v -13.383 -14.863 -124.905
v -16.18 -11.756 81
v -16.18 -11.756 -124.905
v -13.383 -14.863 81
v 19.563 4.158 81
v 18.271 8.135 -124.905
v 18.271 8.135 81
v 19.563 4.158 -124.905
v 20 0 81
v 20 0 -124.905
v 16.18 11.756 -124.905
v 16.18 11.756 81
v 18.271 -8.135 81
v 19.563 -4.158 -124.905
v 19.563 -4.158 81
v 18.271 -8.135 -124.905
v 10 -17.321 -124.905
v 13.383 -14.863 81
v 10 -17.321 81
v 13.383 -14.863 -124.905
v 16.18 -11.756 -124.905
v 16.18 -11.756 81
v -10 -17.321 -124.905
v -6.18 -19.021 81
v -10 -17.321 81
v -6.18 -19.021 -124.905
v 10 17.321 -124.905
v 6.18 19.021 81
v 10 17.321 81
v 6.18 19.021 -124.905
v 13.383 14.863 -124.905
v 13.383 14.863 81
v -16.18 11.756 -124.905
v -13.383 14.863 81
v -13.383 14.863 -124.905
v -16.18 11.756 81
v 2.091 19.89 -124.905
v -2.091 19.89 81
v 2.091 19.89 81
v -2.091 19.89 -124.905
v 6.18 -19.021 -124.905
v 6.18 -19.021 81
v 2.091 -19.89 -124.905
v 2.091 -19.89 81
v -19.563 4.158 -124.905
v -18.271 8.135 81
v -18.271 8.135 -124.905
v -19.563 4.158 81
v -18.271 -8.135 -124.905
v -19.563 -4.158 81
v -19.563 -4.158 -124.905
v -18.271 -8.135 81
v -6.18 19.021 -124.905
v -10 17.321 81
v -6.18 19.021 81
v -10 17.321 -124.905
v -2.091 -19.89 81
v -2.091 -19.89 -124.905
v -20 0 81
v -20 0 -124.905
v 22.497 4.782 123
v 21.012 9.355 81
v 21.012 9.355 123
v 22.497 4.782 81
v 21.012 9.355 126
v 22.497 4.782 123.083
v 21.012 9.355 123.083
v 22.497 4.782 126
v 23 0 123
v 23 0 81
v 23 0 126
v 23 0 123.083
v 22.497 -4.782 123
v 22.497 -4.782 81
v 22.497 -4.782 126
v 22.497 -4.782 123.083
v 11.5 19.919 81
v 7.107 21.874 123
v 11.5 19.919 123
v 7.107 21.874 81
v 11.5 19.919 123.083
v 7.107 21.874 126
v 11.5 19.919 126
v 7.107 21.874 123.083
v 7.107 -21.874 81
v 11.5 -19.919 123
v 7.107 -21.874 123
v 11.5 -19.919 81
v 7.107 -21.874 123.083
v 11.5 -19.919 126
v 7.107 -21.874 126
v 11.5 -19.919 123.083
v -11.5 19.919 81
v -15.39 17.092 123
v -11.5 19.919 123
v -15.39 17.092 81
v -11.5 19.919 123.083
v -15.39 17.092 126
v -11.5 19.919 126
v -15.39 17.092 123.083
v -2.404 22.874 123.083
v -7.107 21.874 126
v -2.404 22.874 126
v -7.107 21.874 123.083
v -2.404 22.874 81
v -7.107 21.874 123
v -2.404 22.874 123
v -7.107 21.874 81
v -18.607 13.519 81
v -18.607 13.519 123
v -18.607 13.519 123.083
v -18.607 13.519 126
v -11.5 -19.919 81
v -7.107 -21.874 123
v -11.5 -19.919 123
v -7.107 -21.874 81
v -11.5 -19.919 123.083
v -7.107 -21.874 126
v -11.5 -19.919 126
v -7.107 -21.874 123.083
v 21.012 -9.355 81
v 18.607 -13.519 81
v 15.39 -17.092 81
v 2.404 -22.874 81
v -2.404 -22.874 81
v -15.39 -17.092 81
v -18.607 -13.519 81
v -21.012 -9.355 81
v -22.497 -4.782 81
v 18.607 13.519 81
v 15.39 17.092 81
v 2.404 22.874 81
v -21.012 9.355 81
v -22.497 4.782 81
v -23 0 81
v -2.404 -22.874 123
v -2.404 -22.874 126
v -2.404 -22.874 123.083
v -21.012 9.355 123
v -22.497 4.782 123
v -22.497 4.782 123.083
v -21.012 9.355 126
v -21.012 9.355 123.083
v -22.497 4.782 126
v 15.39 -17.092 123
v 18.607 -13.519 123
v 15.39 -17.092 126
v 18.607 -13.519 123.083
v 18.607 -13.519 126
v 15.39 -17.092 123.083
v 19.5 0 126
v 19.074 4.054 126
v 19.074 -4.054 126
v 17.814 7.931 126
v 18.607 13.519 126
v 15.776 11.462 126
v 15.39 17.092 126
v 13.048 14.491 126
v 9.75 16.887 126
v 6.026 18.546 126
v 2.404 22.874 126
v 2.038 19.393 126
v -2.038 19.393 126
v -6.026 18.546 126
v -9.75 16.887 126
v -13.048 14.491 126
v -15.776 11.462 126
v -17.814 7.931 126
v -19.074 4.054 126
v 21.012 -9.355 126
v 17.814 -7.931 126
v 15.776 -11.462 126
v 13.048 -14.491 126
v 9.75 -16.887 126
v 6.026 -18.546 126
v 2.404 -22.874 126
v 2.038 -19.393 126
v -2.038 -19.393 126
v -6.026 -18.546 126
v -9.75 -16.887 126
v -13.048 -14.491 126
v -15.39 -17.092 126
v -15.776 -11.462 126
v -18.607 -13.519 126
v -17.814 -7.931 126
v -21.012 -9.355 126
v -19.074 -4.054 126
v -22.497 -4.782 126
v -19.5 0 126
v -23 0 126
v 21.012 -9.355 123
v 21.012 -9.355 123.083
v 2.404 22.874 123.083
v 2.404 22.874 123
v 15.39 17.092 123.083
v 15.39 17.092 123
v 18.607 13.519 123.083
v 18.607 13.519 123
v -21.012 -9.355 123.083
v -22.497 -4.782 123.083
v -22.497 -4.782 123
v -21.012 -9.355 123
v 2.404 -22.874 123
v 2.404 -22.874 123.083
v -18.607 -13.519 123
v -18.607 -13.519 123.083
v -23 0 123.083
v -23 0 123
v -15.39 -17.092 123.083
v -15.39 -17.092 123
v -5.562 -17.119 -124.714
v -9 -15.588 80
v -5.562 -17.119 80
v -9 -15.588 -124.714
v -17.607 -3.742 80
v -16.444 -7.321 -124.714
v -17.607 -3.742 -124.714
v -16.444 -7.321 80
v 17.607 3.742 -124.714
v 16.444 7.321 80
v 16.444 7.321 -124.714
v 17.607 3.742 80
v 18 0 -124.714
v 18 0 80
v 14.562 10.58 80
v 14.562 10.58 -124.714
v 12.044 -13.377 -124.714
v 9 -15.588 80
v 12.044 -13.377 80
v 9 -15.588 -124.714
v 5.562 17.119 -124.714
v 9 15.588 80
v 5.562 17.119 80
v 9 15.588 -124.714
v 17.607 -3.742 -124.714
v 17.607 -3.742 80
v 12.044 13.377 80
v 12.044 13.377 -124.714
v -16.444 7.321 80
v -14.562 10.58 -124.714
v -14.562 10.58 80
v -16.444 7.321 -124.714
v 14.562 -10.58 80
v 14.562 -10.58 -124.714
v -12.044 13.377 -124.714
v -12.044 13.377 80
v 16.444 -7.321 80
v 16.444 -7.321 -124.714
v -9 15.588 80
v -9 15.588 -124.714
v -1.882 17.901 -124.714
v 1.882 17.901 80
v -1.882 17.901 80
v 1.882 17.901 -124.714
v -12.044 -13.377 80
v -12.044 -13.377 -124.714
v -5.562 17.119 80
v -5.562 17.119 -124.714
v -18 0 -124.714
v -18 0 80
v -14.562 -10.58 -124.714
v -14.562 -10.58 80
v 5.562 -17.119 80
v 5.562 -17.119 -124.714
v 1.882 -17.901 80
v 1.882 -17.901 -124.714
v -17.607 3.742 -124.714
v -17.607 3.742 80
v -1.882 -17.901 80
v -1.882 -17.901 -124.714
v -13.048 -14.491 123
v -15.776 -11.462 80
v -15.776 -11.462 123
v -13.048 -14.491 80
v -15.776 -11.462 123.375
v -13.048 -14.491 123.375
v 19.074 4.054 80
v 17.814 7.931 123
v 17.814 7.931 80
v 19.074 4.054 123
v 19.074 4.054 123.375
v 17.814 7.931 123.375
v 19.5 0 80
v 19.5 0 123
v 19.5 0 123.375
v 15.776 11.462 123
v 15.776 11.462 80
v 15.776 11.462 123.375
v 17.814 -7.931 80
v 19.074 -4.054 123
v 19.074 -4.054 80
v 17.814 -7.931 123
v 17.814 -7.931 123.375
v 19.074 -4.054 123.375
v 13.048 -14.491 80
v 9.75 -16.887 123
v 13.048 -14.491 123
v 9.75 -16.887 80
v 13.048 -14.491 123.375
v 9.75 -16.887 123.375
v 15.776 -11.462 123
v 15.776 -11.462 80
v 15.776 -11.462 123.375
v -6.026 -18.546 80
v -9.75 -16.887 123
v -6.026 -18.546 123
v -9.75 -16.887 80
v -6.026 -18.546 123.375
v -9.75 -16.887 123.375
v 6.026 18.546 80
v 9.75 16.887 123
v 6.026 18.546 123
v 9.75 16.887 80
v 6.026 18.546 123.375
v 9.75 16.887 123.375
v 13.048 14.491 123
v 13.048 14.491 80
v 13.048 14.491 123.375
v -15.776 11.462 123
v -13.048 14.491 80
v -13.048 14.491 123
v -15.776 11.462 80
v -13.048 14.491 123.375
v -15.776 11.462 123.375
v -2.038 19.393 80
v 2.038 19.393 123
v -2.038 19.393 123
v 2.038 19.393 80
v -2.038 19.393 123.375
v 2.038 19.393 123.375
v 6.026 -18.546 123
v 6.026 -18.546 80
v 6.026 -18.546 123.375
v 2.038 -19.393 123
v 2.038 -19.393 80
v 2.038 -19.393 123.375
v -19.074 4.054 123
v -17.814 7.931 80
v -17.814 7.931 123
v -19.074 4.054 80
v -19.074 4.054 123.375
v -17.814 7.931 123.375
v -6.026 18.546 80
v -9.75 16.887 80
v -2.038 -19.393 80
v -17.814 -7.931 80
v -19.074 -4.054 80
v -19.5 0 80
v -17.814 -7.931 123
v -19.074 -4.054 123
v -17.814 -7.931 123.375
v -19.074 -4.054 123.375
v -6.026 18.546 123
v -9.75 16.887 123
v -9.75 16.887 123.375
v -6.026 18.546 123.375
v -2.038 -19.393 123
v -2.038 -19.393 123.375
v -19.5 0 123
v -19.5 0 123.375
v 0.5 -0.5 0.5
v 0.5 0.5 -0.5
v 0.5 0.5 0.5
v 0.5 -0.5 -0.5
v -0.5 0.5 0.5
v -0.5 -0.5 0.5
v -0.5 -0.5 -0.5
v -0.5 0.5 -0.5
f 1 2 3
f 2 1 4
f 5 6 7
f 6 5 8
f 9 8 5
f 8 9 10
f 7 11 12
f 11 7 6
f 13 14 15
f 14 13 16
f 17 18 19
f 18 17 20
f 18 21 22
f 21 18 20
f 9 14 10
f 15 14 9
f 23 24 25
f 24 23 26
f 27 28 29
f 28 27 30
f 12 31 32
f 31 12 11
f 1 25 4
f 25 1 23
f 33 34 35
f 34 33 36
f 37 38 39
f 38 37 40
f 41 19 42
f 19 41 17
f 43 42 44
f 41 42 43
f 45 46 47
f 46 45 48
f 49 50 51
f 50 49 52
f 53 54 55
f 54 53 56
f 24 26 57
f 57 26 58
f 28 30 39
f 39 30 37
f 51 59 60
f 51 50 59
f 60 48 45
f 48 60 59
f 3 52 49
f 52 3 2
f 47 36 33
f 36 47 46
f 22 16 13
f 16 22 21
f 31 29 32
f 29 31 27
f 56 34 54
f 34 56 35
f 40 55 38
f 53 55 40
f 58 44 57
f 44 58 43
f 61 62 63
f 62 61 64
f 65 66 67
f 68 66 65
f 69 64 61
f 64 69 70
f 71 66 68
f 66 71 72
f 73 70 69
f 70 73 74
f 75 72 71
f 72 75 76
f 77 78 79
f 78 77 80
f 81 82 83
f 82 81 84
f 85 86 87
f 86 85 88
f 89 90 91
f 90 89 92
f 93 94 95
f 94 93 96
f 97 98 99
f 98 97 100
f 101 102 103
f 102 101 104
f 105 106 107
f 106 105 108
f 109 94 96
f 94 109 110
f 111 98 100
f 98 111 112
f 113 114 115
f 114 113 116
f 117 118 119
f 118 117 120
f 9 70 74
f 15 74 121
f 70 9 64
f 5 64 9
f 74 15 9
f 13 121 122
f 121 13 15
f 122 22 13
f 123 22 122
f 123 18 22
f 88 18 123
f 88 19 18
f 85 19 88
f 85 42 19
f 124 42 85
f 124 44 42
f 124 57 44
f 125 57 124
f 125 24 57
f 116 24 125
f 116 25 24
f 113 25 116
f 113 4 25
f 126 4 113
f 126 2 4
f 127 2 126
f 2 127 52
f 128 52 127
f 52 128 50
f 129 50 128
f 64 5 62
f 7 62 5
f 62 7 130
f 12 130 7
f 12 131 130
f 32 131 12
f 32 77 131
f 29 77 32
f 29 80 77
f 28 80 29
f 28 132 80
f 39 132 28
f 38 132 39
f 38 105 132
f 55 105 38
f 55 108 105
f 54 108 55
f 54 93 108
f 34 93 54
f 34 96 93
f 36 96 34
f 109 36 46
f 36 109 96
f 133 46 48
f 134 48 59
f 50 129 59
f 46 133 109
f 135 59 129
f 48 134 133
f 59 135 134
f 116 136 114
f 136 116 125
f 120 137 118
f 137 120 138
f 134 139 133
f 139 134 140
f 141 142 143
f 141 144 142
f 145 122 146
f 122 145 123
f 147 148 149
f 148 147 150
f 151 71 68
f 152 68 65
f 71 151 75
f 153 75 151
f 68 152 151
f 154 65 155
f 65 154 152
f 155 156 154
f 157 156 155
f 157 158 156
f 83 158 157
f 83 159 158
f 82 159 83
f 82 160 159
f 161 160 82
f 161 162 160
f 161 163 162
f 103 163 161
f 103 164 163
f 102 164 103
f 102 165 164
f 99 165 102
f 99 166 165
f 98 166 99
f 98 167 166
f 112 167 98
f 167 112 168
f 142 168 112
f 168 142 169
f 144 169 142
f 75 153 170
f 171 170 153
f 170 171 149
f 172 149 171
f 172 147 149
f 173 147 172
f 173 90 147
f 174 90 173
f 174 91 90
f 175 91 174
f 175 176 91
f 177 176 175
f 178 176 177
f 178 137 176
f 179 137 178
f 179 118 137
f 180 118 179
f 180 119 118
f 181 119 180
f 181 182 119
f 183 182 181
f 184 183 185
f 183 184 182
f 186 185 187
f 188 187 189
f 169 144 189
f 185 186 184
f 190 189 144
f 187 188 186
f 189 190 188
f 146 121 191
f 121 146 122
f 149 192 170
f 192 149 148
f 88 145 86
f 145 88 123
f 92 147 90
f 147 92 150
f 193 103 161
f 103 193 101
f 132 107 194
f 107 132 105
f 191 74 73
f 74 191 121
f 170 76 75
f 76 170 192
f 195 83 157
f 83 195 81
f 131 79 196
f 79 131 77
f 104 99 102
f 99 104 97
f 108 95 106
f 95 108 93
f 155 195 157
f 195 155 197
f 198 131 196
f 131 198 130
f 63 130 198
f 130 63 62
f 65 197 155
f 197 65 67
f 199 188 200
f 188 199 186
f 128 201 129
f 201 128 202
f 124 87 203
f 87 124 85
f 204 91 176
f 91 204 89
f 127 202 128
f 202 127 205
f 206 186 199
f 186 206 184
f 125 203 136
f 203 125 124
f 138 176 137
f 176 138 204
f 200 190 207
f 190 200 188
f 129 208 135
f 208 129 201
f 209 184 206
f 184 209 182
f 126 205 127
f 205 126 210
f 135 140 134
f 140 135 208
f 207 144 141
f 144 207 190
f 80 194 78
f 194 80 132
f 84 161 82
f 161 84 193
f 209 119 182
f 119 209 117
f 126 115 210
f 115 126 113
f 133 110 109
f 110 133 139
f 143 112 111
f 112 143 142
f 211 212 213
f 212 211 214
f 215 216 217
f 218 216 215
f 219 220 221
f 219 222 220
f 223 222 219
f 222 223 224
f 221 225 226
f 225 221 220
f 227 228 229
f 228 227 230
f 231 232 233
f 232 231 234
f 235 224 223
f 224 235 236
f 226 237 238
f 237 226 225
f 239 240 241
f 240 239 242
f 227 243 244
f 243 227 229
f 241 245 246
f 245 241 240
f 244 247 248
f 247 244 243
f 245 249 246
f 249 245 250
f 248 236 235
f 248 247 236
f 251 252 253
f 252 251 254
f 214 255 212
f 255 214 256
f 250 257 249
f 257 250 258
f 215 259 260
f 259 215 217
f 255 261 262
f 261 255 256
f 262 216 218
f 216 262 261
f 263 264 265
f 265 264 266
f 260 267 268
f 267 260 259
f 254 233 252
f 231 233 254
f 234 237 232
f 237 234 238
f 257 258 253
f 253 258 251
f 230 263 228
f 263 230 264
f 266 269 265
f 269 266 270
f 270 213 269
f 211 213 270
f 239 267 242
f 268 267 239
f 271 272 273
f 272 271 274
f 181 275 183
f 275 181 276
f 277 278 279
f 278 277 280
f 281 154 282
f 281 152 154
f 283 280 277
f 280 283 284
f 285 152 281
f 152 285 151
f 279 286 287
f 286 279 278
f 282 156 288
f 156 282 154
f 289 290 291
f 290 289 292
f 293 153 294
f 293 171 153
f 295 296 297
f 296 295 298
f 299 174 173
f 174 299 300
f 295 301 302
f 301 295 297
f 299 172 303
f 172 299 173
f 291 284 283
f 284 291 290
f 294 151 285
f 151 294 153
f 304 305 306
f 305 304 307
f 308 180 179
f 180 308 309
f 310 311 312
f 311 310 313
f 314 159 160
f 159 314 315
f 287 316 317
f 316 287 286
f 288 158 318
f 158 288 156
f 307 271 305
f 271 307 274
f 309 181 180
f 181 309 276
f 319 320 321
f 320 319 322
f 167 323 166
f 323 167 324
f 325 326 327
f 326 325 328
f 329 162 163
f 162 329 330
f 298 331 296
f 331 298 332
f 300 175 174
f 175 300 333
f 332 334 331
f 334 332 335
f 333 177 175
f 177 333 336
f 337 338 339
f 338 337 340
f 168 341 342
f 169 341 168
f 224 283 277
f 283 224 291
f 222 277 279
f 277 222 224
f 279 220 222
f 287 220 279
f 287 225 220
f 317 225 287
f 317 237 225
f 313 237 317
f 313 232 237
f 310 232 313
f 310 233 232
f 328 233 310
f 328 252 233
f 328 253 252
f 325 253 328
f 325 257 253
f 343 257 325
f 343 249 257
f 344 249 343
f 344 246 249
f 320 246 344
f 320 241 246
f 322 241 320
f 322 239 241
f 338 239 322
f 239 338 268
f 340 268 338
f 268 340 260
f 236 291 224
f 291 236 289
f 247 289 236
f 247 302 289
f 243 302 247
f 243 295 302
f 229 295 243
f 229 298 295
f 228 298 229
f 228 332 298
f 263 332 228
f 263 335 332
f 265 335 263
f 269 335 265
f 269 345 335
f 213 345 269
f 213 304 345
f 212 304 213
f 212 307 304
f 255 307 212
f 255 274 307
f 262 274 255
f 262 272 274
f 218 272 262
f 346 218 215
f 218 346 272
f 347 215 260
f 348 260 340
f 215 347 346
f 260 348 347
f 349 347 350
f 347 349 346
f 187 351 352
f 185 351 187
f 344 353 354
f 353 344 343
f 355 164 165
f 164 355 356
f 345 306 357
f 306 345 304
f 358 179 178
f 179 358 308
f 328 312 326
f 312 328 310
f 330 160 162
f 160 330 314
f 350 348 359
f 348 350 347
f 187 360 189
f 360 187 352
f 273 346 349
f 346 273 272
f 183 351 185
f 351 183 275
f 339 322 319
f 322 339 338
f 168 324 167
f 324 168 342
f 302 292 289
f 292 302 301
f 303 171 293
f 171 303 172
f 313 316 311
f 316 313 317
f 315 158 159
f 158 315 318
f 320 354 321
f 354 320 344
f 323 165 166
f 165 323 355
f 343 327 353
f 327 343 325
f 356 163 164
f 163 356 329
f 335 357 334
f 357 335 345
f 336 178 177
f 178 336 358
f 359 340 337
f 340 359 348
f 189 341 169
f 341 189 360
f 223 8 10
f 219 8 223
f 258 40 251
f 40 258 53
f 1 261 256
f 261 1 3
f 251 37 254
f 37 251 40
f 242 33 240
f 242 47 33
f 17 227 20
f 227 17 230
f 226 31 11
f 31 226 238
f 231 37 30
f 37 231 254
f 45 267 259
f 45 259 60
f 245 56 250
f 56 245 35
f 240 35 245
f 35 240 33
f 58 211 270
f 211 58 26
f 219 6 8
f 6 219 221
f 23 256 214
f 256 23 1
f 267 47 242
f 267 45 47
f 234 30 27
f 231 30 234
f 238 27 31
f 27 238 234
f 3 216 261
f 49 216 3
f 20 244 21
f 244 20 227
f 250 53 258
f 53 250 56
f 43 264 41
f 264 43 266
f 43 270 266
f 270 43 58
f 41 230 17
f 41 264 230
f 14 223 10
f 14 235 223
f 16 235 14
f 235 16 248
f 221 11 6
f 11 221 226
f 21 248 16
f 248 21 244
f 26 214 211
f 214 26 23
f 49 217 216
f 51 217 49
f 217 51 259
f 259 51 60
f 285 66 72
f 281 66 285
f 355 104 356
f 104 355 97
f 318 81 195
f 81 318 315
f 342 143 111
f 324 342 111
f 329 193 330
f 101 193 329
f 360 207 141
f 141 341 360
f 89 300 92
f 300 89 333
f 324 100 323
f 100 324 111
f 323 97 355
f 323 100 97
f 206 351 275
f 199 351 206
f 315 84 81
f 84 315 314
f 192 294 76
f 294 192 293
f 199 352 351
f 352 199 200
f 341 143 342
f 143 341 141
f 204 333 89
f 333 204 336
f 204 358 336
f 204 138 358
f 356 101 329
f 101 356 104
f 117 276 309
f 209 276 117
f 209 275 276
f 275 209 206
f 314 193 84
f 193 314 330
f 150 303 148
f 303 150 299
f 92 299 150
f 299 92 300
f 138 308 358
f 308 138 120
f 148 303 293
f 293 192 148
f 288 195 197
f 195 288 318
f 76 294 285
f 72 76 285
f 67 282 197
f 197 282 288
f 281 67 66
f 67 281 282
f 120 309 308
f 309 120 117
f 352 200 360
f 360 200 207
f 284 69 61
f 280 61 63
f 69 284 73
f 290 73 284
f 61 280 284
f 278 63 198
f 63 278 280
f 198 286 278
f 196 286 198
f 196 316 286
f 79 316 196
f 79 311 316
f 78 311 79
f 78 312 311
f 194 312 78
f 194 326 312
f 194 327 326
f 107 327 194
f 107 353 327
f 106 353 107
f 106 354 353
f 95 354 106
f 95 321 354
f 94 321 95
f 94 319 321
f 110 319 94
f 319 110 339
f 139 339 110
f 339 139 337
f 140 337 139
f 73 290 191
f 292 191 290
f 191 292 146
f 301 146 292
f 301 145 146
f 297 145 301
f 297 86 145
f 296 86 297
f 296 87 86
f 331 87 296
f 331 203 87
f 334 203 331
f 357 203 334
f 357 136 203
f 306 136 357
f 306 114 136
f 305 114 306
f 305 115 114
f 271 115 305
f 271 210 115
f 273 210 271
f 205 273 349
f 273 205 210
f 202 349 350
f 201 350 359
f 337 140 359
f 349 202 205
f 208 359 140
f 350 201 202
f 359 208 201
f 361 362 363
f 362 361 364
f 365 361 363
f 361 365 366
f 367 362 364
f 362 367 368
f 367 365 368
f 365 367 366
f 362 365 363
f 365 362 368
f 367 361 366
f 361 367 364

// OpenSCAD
// Parameters
pipe_length = 250; //[125:500:1]
outer_diameter = 40; //[20:80:1]
wall_thickness = 2; //[1:4:0.1]
socket_length = 45; //[25:90:1]
socket_wall_extra = 1.5; //[0.5:3:0.1]
socket_od_extra = 6; //[2:12:0.5]
chamfer_length = 2; //[0.5:5:0.1]
overlap = 1; //[0.5:2:0.1]

// Base Shapes
module pipe_body() {
  translate([0, 0, 0])
    cylinder(h=pipe_length, r=outer_diameter/2, center=true);
}

module inner_bore() {
  translate([0, 0, 0])
    cylinder(h=pipe_length + 2*overlap, r=outer_diameter/2 - wall_thickness, center=true);
}

module socket_end() {
  translate([0, 0, pipe_length/2 - socket_length/2 + overlap])
    cylinder(h=socket_length, r=(outer_diameter + socket_od_extra)/2, center=true);
}

module socket_inner_bore() {
  translate([0, 0, pipe_length/2 - socket_length/2 + overlap])
    cylinder(h=socket_length + 2*overlap, r=(outer_diameter + socket_od_extra)/2 - (wall_thickness + socket_wall_extra), center=true);
}

module chamfer_cut_spigot() {
  translate([0, 0, -pipe_length/2 + chamfer_length/2])
    cylinder(h=chamfer_length, r1=outer_diameter/2 + overlap, r2=0, center=true);
}

module chamfer_cut_socket_outer() {
  translate([0, 0, pipe_length/2 - chamfer_length/2])
    cylinder(h=chamfer_length, r1=(outer_diameter + socket_od_extra)/2 + overlap, r2=0, center=true);
}

module markings_text() {
  translate([0, 0, 0])
    cube([overlap, overlap, overlap], center=true);
}

// Operations
module pipe_plus_socket() {
  union() {
    pipe_body();
    socket_end();
  }
}

module hollow_with_socket_bore() {
  difference() {
    pipe_plus_socket();
    inner_bore();
    socket_inner_bore();
  }
}

module chamfers() {
  difference() {
    hollow_with_socket_bore();
    chamfer_cut_spigot();
    chamfer_cut_socket_outer();
  }
}

module final_model() {
  union() {
    chamfers();
    markings_text();
  }
}

// Final Output
final_model();
